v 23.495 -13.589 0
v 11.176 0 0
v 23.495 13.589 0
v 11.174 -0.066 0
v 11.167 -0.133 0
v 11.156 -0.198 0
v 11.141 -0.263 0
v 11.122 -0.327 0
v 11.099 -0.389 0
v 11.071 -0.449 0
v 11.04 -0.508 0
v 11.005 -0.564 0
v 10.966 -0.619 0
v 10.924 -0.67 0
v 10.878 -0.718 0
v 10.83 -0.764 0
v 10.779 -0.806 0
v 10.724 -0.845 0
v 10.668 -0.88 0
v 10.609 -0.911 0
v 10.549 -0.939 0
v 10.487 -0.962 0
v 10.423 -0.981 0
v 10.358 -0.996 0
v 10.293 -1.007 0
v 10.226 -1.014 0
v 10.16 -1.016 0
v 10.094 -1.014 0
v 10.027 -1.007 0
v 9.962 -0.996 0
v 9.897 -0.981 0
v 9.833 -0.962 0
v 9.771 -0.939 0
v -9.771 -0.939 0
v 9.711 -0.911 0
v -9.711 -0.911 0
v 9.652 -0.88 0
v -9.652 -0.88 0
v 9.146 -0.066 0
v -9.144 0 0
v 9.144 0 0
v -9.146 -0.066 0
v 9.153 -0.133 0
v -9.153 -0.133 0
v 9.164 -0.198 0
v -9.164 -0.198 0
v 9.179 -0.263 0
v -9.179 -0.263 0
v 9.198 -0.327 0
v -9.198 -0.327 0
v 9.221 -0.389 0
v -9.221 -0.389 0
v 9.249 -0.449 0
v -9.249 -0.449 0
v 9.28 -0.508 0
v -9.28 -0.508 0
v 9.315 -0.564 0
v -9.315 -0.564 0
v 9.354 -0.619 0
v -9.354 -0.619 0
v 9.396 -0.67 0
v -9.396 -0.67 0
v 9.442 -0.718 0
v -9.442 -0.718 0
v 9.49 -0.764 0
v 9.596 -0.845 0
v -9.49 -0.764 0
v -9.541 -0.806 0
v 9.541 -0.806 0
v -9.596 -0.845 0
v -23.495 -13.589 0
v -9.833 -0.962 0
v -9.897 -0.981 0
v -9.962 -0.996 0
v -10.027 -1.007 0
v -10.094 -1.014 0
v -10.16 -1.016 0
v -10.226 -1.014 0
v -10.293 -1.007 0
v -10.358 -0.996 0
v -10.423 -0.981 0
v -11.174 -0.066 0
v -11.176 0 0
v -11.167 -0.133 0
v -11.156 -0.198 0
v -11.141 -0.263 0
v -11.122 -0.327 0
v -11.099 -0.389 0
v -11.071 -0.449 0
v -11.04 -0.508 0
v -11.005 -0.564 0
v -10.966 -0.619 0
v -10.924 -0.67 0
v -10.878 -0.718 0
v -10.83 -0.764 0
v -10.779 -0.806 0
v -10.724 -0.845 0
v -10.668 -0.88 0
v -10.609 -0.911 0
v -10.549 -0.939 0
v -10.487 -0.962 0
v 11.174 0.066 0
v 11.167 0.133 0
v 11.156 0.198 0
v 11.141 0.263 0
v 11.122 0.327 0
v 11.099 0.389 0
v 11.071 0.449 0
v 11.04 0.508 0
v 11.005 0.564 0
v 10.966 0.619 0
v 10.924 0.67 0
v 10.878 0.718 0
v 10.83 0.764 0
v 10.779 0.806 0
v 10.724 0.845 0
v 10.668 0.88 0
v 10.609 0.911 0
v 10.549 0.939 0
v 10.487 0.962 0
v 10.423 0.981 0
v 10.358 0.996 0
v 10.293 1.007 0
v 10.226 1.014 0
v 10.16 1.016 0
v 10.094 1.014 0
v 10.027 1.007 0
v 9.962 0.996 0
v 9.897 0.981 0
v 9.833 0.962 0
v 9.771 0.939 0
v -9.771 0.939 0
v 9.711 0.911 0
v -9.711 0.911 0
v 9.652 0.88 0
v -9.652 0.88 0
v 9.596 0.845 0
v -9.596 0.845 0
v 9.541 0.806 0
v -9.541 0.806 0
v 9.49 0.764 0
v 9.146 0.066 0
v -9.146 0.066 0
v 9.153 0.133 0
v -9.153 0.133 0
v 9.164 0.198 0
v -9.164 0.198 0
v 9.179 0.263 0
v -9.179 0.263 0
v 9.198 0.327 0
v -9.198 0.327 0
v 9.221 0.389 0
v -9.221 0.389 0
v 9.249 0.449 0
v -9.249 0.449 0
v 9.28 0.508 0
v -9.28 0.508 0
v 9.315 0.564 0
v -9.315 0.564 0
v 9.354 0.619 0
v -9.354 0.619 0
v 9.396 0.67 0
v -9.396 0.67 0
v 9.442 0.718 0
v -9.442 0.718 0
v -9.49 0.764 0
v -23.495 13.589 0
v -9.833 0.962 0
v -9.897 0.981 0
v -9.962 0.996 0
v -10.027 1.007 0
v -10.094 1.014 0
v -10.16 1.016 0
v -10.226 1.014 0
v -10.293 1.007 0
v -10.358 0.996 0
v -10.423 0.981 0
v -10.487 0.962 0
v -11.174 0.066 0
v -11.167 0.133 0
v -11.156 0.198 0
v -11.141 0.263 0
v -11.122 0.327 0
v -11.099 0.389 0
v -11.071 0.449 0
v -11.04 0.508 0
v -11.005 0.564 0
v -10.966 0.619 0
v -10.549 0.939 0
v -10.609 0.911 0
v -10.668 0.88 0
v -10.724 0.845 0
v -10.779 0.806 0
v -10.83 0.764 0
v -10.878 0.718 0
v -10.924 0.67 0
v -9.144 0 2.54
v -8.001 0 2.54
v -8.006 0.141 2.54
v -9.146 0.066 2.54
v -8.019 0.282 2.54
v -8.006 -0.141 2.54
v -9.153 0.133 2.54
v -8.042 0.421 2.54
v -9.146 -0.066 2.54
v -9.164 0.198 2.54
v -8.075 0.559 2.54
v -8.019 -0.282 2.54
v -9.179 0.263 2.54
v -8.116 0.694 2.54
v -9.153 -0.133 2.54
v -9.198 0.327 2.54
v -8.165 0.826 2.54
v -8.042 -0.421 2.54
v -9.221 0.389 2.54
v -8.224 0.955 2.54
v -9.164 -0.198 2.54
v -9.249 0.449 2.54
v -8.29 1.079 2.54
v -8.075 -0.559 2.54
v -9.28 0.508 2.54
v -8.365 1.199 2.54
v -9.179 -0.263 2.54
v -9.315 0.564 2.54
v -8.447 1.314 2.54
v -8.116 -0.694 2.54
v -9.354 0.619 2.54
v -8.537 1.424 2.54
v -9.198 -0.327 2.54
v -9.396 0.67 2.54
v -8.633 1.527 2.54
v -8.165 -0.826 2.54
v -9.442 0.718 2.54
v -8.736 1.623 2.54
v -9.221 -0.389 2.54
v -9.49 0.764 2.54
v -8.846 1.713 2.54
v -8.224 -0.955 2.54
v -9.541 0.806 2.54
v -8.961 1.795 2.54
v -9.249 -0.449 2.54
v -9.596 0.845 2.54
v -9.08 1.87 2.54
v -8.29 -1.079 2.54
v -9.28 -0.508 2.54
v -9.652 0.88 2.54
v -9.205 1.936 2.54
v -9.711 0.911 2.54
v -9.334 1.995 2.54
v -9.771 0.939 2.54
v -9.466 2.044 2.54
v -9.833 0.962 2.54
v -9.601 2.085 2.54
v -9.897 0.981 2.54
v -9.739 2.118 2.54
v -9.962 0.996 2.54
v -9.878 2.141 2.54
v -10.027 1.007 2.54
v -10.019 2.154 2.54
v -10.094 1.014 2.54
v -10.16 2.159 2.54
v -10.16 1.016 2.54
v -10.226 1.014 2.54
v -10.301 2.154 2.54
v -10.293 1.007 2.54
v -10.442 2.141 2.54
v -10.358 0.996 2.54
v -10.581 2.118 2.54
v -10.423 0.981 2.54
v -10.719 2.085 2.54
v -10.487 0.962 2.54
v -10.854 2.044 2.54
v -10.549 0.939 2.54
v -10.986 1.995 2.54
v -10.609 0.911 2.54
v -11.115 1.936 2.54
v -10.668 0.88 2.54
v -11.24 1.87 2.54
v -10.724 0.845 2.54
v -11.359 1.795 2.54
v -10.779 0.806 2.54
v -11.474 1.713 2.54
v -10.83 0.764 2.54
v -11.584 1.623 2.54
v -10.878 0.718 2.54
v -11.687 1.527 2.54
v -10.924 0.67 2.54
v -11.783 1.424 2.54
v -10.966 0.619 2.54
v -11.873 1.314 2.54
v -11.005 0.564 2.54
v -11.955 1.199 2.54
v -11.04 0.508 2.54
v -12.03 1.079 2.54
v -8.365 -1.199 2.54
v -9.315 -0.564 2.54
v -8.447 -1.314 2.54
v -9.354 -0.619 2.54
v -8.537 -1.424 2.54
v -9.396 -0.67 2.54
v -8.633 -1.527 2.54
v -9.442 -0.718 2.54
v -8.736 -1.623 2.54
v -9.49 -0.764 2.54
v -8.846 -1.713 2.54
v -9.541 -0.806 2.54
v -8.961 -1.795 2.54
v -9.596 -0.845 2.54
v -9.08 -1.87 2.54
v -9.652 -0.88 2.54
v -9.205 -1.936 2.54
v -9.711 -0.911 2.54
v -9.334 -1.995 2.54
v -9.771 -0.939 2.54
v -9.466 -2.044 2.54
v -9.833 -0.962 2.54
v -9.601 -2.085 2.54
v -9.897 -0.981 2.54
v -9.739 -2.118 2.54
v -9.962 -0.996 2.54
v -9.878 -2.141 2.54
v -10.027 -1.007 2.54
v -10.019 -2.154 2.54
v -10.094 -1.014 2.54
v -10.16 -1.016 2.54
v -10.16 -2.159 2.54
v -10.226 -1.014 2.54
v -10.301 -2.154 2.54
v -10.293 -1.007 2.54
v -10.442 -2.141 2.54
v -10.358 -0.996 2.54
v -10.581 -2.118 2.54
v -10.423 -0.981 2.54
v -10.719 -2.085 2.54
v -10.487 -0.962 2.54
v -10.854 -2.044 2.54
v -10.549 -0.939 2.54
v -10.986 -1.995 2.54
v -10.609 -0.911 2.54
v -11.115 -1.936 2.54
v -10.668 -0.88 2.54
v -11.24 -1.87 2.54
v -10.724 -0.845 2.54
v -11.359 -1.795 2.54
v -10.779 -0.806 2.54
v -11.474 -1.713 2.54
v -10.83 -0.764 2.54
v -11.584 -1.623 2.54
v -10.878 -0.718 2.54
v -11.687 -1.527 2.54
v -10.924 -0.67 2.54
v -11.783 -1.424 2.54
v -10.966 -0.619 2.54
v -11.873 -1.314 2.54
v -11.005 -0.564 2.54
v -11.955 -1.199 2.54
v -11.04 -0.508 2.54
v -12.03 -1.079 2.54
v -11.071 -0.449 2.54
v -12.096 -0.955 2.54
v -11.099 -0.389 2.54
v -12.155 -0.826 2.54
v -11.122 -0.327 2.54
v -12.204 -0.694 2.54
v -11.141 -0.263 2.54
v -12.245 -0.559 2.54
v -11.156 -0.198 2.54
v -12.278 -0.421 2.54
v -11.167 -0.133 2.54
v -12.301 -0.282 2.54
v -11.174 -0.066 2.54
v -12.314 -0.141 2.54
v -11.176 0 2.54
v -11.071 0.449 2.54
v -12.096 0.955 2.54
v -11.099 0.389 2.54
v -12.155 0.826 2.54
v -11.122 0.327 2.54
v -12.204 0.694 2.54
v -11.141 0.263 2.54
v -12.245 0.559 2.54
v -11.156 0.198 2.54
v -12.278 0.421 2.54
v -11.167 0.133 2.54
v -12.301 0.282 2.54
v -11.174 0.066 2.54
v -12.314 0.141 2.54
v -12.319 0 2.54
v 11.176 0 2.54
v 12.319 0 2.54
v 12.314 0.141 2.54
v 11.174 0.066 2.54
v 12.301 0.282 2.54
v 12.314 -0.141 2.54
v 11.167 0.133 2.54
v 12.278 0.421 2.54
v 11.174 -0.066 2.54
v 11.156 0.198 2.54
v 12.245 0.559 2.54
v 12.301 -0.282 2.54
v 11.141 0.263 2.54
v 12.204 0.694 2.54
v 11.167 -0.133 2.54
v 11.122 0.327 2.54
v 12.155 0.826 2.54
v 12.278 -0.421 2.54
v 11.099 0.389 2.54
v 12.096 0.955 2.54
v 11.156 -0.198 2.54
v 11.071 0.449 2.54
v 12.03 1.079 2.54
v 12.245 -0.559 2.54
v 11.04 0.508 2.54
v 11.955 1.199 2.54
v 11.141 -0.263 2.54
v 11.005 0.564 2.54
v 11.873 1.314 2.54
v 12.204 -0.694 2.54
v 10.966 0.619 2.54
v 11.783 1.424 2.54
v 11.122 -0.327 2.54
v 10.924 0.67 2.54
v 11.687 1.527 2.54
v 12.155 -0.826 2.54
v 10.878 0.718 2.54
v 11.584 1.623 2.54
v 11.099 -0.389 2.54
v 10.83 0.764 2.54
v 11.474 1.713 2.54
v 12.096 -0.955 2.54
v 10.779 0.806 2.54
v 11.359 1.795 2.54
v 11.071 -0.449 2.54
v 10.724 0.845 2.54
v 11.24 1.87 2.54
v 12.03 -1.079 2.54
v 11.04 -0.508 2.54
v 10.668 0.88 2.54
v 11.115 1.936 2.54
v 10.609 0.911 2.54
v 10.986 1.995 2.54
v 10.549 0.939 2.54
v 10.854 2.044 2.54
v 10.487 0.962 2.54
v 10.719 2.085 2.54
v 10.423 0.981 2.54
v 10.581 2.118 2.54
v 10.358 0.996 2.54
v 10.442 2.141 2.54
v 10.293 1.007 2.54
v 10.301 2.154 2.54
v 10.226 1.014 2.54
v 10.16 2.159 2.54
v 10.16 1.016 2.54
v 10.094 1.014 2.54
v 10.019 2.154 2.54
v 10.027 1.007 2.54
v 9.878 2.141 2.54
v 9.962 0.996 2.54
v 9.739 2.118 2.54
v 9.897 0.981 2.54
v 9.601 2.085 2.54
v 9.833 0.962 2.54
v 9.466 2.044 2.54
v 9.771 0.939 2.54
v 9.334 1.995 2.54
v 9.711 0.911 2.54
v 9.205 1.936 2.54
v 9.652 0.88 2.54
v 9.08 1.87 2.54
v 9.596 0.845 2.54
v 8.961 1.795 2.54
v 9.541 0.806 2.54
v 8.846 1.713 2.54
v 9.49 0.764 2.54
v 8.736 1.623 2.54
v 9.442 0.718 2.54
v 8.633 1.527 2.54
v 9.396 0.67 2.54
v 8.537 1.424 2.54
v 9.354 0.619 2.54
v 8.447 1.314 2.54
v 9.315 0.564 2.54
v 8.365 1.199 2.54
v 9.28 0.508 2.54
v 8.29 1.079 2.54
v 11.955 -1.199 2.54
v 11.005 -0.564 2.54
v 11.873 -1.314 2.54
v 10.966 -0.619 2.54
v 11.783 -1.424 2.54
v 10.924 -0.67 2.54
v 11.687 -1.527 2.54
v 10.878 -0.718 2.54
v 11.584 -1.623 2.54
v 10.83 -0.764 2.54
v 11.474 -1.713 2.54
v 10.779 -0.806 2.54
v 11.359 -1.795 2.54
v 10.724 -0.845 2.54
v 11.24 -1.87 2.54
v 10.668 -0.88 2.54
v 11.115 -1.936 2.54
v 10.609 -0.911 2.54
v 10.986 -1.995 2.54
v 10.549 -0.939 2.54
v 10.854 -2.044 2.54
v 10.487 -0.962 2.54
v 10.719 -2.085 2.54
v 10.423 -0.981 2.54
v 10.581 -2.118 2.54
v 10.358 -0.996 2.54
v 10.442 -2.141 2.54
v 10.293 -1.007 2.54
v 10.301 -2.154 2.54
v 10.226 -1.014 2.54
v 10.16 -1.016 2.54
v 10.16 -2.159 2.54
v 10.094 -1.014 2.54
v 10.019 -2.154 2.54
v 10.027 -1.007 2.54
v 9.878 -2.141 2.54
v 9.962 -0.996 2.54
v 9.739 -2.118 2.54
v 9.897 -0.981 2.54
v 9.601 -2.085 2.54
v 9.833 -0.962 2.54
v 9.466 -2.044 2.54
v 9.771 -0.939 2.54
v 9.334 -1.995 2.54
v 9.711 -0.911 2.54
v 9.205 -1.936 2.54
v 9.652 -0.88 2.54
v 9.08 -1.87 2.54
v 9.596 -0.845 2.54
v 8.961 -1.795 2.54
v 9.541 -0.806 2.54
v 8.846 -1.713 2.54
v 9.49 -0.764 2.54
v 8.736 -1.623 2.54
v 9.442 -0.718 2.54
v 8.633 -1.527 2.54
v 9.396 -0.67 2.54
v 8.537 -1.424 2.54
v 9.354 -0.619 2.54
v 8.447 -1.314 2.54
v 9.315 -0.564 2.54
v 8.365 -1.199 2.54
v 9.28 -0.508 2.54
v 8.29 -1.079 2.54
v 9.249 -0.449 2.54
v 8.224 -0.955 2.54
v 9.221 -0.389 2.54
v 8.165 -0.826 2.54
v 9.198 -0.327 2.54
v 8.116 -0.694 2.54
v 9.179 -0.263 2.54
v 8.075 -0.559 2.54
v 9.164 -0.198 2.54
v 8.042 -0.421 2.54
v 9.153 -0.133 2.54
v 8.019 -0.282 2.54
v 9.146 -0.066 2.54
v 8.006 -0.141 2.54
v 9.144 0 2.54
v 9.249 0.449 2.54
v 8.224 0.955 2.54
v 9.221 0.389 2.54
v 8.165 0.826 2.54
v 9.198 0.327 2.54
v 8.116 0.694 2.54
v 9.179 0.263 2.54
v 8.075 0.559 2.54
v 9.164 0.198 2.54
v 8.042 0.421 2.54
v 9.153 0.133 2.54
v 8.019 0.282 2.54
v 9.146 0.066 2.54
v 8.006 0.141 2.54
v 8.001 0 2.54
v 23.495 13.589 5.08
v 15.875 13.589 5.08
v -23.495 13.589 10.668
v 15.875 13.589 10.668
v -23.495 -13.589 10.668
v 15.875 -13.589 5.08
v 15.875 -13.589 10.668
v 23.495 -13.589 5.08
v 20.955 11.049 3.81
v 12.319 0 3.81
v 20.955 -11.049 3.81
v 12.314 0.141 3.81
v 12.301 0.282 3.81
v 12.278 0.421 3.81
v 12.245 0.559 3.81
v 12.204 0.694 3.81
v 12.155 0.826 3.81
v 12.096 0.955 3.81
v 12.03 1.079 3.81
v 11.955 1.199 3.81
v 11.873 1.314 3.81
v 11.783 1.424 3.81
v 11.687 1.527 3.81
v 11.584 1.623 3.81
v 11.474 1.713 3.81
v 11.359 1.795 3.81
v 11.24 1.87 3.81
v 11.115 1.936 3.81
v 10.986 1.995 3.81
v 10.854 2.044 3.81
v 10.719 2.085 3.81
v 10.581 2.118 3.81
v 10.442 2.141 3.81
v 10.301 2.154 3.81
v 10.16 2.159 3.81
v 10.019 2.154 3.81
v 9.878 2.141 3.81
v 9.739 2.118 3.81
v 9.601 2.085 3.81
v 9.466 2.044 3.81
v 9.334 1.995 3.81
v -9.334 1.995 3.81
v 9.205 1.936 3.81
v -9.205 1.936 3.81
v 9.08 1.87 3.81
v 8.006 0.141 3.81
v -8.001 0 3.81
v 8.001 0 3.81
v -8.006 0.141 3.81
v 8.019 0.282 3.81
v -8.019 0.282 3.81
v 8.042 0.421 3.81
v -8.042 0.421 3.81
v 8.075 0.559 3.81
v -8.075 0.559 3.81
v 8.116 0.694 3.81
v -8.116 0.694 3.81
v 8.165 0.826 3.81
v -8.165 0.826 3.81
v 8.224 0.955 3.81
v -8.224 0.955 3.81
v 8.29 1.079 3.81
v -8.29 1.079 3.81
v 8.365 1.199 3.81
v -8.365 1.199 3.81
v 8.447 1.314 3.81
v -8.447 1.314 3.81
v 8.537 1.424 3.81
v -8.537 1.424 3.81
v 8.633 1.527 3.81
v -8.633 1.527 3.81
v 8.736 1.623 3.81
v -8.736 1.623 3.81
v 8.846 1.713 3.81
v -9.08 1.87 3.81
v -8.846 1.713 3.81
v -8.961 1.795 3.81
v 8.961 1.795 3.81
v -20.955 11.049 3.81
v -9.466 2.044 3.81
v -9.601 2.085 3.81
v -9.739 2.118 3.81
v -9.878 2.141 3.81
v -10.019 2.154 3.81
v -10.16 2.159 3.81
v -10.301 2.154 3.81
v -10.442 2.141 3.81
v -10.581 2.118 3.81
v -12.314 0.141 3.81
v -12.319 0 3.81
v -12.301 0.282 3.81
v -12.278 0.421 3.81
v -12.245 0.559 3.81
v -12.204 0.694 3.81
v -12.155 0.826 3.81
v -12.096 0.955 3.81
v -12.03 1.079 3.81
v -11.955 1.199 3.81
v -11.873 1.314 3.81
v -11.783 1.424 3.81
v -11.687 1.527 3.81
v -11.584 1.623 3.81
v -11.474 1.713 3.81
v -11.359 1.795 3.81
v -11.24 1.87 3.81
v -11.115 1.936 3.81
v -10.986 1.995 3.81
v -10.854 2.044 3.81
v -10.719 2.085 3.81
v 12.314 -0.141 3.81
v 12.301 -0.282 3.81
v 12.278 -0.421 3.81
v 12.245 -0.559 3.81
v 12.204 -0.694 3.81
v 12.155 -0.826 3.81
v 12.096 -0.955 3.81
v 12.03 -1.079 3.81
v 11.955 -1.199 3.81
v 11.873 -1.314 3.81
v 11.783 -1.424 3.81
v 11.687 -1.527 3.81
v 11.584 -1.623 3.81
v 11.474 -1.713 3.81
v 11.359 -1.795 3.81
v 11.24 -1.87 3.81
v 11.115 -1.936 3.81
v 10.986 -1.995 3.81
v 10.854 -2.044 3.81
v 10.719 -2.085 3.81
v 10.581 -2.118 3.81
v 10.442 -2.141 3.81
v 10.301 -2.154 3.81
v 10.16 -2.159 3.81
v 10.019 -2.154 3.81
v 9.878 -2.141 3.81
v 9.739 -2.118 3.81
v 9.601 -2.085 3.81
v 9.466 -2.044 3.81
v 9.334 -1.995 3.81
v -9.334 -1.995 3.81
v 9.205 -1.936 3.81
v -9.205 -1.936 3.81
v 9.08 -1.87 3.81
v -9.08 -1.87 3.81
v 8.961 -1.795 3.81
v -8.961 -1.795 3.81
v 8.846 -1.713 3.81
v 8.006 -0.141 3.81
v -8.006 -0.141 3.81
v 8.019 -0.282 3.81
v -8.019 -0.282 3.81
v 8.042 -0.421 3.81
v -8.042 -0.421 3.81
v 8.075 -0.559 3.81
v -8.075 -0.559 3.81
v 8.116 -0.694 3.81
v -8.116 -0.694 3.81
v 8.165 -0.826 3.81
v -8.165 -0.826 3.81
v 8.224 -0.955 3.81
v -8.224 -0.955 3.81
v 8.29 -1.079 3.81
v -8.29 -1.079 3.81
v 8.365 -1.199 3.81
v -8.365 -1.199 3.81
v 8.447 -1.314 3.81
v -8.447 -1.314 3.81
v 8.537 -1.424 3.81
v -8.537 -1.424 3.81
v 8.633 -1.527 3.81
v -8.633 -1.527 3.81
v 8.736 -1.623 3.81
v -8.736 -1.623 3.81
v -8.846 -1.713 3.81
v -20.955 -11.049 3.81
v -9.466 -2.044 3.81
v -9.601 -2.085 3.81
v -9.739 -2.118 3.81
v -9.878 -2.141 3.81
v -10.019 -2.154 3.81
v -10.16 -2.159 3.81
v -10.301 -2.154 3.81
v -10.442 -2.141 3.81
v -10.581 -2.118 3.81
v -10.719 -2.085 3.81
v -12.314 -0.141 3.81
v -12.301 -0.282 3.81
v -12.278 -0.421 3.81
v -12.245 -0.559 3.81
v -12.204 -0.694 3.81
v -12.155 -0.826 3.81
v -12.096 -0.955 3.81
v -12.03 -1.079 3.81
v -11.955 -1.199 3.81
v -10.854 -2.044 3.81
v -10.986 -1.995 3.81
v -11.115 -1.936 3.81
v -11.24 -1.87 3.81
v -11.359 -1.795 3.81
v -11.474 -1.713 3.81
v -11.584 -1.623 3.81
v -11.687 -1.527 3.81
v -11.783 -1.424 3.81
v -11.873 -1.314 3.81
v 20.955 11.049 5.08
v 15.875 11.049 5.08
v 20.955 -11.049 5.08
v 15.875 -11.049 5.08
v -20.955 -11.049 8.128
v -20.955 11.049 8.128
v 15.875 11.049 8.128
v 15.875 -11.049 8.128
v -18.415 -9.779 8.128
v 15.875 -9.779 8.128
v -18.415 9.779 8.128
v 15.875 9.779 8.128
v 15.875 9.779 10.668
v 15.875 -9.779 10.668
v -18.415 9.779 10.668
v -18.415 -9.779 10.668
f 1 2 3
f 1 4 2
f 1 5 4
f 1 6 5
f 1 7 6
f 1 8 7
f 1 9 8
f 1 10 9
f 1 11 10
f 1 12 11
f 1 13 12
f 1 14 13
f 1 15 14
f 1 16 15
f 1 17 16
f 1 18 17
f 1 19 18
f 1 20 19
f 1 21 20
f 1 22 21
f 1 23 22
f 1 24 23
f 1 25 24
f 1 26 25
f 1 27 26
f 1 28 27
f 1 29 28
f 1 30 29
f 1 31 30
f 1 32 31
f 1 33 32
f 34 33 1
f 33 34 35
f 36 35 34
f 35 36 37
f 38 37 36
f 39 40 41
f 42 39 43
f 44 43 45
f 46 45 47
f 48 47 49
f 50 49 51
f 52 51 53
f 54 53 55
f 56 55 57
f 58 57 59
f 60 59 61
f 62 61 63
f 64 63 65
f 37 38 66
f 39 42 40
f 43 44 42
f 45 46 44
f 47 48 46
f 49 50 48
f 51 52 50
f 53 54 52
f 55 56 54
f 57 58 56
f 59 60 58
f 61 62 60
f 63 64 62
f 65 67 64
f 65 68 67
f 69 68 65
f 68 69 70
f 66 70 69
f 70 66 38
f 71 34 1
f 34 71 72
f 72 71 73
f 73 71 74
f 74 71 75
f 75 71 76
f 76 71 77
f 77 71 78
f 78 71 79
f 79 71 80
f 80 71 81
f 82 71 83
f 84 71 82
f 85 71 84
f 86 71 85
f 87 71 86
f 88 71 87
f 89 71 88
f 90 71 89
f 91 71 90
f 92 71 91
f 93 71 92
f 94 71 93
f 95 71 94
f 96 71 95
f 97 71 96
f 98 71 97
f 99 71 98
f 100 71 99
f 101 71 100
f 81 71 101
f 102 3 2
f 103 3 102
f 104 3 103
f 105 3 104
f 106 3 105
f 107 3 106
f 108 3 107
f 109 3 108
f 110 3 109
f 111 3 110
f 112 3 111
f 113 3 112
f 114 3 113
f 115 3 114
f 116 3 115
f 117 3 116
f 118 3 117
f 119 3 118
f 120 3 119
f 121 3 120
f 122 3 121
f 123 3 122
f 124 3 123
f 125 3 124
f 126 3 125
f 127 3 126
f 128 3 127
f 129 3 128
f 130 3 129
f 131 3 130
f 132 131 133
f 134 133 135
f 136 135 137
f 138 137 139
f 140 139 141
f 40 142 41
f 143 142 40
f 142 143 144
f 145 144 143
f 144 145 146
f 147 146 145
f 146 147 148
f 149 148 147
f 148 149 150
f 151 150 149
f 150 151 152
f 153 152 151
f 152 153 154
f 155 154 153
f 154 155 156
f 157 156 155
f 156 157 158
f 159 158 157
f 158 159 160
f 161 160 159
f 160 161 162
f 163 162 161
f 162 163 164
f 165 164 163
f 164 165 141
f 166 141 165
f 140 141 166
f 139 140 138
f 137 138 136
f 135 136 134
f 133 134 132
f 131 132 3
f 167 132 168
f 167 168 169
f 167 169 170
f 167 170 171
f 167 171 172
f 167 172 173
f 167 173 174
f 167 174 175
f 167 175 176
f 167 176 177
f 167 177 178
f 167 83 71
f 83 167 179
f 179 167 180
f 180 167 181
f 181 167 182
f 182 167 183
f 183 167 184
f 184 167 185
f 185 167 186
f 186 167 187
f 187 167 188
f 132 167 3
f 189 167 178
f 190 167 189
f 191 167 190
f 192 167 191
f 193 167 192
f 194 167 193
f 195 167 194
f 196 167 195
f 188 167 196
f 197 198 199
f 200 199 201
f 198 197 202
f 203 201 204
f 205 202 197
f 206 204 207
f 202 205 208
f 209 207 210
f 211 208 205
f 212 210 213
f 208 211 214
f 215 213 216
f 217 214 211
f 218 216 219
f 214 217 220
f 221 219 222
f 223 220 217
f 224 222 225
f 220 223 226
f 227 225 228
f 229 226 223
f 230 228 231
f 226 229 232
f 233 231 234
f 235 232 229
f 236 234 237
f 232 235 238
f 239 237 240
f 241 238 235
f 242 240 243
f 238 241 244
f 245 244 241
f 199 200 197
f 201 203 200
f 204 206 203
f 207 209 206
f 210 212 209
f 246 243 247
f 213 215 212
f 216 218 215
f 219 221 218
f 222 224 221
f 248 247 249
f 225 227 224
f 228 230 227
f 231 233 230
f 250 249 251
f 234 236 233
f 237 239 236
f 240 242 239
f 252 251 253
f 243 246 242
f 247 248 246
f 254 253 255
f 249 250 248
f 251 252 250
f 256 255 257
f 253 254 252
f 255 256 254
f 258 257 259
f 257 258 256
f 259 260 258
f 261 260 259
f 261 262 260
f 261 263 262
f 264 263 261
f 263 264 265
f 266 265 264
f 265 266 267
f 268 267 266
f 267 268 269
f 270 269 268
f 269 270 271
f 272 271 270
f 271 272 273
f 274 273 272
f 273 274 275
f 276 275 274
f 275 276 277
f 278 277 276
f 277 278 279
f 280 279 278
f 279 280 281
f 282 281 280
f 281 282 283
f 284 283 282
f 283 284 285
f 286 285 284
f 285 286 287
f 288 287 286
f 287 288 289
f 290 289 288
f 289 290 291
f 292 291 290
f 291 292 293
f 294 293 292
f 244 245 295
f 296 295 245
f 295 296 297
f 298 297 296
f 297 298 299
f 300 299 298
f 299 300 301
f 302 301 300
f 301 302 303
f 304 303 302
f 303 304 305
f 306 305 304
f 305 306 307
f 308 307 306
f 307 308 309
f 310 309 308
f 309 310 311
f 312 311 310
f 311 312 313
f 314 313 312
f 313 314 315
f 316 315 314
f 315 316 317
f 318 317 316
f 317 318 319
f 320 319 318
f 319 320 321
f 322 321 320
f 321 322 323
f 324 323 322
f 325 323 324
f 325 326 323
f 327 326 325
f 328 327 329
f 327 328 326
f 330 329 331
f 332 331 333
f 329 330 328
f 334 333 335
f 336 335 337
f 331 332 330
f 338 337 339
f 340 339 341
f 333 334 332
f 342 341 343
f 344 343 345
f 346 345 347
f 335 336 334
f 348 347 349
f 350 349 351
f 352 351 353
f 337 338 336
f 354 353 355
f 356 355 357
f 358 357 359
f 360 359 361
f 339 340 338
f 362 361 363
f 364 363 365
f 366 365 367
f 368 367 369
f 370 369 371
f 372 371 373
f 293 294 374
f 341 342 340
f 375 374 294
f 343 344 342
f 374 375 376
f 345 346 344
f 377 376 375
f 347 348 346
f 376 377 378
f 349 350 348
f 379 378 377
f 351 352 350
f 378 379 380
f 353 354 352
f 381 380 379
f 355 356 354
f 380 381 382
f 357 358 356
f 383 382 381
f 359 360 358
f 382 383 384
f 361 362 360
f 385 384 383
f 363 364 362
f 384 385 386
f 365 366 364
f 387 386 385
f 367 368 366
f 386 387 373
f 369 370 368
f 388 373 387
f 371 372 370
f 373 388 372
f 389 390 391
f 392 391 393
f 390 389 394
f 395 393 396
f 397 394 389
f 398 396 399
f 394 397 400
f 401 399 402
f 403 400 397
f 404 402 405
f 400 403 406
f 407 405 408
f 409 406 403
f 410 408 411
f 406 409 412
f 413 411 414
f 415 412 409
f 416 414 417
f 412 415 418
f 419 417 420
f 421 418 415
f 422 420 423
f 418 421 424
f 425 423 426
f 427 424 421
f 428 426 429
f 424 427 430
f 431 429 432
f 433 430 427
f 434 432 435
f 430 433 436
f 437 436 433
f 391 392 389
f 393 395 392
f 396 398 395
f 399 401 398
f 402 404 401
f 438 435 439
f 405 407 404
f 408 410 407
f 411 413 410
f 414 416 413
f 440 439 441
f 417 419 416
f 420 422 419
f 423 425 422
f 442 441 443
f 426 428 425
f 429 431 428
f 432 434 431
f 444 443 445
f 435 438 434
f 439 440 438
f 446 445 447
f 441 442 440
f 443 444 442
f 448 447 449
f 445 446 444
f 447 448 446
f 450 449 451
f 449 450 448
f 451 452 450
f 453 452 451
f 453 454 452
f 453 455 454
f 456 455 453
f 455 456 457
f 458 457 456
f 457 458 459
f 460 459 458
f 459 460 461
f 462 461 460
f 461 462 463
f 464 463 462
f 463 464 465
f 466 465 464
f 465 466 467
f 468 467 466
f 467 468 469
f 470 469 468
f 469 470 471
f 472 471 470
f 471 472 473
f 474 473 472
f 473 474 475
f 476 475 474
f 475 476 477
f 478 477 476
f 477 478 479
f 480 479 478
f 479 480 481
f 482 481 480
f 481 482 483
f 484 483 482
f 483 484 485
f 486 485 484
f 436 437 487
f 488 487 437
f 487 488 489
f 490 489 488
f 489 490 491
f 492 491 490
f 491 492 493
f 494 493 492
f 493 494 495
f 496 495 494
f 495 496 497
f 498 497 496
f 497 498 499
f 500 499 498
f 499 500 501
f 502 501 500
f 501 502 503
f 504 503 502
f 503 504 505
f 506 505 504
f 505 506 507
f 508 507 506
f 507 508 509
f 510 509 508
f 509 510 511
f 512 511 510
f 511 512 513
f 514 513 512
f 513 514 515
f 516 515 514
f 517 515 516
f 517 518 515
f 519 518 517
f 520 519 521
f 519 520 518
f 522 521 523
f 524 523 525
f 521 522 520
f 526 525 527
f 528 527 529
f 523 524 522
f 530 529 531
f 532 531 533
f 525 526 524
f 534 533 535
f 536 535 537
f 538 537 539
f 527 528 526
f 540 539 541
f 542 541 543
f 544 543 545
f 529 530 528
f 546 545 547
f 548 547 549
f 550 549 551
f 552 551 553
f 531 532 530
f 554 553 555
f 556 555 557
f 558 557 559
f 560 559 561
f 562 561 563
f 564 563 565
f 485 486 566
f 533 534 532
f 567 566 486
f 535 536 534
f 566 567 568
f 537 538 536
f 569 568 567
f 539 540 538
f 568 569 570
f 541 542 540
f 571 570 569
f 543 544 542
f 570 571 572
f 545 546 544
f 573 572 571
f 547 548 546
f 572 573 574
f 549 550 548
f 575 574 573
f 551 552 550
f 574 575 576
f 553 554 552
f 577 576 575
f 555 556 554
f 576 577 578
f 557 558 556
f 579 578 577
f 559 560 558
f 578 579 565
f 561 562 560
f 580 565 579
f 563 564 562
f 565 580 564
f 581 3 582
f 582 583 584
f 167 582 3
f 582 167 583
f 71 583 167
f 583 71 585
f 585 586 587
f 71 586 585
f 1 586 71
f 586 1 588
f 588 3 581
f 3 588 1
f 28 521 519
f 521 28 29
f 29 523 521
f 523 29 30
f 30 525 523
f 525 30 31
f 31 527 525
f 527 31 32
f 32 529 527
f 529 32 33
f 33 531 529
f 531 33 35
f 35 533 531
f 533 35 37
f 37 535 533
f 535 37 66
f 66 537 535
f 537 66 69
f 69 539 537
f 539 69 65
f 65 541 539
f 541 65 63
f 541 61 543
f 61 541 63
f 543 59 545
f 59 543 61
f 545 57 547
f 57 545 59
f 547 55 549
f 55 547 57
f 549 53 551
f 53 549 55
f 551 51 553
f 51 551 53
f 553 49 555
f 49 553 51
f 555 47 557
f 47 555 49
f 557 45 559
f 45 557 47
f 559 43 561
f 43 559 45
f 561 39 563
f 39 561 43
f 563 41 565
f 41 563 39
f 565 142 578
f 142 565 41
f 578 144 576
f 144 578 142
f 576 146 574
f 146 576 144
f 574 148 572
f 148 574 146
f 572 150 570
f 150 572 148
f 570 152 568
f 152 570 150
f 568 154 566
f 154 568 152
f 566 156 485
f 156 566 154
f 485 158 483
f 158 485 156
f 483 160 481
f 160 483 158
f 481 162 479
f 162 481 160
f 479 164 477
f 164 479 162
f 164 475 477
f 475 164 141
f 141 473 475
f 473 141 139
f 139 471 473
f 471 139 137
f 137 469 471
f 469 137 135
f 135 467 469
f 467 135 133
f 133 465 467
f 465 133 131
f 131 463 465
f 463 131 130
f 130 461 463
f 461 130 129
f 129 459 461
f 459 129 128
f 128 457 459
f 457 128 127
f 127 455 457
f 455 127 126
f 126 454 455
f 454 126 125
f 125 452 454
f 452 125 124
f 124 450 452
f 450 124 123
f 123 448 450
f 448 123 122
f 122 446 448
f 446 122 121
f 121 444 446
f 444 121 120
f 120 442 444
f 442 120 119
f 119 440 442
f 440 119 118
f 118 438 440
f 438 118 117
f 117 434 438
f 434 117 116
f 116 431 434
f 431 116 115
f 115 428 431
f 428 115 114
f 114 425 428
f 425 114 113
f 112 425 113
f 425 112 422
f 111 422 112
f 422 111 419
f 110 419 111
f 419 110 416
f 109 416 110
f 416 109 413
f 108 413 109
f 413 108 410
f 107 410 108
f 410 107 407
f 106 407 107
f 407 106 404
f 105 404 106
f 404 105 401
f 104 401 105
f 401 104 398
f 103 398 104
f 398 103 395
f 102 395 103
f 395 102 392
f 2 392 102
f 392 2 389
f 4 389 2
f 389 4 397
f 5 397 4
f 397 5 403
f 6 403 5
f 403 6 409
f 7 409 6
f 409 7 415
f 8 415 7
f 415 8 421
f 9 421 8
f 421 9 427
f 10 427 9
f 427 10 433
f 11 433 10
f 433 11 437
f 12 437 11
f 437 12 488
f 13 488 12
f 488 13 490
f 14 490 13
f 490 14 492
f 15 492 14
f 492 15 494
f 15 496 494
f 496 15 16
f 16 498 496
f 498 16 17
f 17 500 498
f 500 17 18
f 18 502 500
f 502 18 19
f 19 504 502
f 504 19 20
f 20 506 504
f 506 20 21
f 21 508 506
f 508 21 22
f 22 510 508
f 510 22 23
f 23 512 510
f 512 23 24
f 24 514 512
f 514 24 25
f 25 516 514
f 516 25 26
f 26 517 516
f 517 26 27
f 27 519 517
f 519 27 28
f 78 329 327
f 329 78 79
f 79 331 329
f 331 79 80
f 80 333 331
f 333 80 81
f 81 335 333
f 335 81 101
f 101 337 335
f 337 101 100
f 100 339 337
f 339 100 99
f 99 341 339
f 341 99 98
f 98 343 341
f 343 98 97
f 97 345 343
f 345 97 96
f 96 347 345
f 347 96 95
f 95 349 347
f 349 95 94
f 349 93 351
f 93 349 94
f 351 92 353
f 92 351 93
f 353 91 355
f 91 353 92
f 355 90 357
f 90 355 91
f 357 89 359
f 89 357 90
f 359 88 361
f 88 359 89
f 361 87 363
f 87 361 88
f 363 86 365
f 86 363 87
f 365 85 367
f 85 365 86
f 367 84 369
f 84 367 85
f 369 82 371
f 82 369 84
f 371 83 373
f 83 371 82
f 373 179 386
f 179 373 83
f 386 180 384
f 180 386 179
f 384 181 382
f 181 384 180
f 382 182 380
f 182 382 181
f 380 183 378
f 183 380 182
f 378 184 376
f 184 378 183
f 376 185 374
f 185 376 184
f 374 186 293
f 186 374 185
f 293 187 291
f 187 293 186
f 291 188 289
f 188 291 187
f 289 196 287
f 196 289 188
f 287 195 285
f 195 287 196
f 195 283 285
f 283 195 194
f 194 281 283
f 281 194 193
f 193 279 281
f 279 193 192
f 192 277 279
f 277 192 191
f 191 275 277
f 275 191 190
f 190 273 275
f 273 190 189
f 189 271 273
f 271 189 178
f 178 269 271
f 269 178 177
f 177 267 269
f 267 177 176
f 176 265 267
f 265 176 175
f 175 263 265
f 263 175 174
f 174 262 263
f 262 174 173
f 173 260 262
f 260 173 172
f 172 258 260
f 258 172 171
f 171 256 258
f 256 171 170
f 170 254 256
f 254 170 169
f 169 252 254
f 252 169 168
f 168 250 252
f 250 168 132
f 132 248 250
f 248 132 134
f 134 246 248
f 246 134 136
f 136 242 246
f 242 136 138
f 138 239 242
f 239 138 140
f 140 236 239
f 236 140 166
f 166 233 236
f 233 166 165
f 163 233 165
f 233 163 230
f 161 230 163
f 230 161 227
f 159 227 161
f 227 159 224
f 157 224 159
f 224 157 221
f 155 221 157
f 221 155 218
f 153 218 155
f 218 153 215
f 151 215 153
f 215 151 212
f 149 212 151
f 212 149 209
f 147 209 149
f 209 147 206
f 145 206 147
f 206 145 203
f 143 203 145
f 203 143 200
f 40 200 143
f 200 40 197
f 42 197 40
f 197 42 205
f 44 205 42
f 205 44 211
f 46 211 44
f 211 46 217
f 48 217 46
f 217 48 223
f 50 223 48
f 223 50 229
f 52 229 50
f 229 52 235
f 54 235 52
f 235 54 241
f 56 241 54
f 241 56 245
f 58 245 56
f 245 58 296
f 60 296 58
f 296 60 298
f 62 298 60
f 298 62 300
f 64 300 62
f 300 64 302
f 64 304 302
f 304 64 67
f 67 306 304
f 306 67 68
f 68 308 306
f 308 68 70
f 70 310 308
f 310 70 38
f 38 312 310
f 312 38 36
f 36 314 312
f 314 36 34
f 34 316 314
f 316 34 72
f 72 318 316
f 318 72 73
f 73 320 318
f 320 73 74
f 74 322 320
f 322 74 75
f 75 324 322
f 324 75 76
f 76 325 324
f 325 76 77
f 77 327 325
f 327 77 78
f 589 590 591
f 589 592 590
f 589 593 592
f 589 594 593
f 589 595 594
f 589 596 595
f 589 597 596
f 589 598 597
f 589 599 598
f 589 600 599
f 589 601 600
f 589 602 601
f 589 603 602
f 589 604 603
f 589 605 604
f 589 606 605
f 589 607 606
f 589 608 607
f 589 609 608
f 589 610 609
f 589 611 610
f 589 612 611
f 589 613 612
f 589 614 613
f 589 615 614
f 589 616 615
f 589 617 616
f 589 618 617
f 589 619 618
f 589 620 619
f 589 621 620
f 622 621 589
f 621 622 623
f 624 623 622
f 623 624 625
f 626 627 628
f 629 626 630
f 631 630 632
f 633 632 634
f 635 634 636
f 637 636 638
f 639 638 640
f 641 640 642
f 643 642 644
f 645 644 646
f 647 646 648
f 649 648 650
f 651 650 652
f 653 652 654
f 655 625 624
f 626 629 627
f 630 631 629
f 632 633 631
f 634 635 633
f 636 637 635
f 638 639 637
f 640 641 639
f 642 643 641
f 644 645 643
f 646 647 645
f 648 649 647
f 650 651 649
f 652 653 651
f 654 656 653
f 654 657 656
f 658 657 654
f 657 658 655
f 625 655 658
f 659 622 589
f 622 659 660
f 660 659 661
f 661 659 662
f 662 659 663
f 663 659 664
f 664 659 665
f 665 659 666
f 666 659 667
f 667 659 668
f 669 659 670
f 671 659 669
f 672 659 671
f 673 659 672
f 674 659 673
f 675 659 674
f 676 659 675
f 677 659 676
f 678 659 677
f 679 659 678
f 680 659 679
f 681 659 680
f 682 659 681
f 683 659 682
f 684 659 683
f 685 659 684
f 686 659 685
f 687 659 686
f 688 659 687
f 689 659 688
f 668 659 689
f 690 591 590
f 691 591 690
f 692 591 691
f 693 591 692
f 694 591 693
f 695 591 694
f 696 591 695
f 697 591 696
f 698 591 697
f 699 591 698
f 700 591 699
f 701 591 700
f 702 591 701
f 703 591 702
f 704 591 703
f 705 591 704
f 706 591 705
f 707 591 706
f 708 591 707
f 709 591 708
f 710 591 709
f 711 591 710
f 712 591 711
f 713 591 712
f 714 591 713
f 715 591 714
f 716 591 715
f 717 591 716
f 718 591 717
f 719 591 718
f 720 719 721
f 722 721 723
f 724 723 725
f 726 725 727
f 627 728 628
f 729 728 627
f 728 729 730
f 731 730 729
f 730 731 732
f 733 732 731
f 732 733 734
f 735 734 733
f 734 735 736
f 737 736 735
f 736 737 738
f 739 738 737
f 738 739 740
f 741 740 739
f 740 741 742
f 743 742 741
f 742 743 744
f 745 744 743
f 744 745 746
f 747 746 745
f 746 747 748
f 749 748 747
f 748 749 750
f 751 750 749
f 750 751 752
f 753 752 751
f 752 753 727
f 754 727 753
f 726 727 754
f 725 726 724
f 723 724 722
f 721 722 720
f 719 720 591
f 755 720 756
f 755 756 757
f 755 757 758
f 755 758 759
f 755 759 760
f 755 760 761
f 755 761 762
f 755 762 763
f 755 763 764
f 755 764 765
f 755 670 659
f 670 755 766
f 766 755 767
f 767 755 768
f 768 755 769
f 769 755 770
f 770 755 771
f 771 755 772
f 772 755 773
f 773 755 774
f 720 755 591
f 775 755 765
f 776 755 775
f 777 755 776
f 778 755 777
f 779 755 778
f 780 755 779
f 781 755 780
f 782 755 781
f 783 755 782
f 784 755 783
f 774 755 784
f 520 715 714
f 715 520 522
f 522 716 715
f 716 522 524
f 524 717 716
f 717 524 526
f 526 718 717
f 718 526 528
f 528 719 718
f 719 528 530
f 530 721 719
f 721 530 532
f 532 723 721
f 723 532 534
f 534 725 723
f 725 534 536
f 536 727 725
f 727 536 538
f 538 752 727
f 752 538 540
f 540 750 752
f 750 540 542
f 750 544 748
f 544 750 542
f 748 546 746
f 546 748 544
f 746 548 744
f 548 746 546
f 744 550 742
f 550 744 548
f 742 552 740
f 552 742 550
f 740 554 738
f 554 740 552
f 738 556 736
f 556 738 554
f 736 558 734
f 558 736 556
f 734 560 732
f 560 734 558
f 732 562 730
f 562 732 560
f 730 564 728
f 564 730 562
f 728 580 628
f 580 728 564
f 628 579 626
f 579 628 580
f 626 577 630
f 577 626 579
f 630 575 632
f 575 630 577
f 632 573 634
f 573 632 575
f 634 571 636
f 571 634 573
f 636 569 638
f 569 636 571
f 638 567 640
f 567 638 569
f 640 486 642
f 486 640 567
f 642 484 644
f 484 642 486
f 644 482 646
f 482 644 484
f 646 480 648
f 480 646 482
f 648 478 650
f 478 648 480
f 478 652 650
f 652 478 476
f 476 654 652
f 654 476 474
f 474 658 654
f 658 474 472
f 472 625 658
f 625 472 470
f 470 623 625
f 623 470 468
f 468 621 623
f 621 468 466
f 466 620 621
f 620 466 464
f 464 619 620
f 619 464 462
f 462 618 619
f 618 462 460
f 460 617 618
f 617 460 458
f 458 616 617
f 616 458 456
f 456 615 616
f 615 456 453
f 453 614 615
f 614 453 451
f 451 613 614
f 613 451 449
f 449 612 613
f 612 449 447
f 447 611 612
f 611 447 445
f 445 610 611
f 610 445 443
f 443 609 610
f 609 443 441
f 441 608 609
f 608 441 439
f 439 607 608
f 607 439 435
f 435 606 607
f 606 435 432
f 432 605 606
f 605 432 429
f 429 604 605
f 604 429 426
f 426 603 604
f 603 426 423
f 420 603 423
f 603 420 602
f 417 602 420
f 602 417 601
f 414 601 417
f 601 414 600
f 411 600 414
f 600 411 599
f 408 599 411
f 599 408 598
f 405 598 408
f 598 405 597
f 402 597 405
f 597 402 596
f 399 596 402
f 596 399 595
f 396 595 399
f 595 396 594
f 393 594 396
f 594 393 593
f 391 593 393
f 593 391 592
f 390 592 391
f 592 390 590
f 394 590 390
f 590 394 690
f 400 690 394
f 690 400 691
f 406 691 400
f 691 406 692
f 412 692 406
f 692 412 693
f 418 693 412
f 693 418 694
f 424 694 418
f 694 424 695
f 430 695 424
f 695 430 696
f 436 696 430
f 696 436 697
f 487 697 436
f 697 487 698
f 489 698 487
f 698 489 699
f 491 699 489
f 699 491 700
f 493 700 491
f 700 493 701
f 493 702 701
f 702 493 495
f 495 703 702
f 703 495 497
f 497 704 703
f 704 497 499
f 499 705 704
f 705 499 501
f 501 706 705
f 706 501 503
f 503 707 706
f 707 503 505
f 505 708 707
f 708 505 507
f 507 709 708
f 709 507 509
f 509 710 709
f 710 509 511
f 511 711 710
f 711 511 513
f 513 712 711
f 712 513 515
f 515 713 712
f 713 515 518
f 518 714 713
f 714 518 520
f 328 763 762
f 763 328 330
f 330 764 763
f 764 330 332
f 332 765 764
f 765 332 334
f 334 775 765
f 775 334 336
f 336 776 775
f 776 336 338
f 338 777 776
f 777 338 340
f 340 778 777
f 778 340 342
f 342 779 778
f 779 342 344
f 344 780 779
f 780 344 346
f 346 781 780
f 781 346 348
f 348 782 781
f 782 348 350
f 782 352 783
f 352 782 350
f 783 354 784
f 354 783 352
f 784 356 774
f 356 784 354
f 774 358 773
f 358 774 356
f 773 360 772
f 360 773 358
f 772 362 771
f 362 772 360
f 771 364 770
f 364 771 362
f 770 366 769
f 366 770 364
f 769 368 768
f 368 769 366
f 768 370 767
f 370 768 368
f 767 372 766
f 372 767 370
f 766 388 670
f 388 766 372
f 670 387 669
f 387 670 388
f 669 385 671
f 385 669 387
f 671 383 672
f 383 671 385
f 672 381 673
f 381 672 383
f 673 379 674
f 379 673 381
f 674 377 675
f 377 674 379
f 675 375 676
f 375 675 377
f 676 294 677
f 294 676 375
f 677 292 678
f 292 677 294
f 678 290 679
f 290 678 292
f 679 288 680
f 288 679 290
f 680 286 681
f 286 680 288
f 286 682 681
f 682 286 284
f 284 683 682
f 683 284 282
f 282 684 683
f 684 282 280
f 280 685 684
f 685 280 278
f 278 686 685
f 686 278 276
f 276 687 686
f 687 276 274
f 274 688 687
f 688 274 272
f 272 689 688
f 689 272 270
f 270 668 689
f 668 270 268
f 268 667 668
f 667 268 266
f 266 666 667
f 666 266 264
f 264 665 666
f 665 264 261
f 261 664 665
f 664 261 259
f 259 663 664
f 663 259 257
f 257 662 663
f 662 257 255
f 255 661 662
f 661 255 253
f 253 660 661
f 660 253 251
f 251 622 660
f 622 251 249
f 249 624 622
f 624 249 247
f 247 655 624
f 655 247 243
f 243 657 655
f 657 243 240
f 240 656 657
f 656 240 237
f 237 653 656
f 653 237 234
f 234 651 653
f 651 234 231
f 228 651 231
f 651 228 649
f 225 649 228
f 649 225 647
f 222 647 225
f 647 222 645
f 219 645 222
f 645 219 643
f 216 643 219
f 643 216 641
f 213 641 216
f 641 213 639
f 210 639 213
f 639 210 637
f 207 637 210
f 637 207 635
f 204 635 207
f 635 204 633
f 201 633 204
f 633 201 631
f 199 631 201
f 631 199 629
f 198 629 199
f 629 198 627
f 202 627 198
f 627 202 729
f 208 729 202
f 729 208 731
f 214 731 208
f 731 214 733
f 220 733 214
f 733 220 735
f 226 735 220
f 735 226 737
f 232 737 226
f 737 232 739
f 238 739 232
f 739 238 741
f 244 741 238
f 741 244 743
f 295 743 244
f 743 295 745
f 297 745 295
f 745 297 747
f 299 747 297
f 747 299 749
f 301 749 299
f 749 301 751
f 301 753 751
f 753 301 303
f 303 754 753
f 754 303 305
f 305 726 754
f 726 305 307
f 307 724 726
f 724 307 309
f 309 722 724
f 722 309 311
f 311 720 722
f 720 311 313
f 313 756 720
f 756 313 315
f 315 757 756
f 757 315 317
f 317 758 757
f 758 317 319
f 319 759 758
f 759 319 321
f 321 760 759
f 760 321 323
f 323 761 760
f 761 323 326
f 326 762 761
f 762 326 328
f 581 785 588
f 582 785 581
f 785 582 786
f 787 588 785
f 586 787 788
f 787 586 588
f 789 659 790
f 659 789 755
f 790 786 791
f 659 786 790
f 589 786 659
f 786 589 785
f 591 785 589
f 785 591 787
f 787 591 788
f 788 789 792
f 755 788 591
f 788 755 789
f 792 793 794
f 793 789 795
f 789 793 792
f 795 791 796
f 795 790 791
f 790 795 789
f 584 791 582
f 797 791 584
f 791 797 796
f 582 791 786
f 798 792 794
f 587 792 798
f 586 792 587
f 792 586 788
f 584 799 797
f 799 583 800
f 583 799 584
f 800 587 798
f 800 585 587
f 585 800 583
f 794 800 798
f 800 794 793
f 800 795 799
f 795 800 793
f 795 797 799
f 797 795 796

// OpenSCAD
ViewScale = [0.0254, 0.0254, 0.0254];

module base()
{
    linear_extrude(100)
    difference() {
    square([1850, 1070], center=true);
        translate([400, 0, 0])
        circle(80/2, $fn=96);
        translate([-400, 0, 0])
        circle(80/2, $fn=96);
    }

    translate([0, 0, 100])
    linear_extrude(50)
    difference() {
    square([1850, 1070], center=true);
        translate([400, 0, 0])
        circle(170/2, $fn=96);
        translate([-400, 0, 0])
        circle(170/2, $fn=96);
    }

    translate([0, 0, 150])
    linear_extrude(50)
    difference() {
        square([1850, 1070], center=true);
        square([1650, 870], center=true);
    }

    translate([0, 0, 200])
    linear_extrude(120)
    difference() {
        translate([-150, 0, 0])
        square([1550, 1070], center=true);
        square([1650, 870], center=true);
    }

    translate([0, 0, 320])
    linear_extrude(100)
    difference() {
        translate([-150, 0, 0])
        square([1550, 1070], center=true);
        translate([50, 0, 0])
        square([1550, 770], center=true);
    }



}

scale(ViewScale)
{
    base();
}
